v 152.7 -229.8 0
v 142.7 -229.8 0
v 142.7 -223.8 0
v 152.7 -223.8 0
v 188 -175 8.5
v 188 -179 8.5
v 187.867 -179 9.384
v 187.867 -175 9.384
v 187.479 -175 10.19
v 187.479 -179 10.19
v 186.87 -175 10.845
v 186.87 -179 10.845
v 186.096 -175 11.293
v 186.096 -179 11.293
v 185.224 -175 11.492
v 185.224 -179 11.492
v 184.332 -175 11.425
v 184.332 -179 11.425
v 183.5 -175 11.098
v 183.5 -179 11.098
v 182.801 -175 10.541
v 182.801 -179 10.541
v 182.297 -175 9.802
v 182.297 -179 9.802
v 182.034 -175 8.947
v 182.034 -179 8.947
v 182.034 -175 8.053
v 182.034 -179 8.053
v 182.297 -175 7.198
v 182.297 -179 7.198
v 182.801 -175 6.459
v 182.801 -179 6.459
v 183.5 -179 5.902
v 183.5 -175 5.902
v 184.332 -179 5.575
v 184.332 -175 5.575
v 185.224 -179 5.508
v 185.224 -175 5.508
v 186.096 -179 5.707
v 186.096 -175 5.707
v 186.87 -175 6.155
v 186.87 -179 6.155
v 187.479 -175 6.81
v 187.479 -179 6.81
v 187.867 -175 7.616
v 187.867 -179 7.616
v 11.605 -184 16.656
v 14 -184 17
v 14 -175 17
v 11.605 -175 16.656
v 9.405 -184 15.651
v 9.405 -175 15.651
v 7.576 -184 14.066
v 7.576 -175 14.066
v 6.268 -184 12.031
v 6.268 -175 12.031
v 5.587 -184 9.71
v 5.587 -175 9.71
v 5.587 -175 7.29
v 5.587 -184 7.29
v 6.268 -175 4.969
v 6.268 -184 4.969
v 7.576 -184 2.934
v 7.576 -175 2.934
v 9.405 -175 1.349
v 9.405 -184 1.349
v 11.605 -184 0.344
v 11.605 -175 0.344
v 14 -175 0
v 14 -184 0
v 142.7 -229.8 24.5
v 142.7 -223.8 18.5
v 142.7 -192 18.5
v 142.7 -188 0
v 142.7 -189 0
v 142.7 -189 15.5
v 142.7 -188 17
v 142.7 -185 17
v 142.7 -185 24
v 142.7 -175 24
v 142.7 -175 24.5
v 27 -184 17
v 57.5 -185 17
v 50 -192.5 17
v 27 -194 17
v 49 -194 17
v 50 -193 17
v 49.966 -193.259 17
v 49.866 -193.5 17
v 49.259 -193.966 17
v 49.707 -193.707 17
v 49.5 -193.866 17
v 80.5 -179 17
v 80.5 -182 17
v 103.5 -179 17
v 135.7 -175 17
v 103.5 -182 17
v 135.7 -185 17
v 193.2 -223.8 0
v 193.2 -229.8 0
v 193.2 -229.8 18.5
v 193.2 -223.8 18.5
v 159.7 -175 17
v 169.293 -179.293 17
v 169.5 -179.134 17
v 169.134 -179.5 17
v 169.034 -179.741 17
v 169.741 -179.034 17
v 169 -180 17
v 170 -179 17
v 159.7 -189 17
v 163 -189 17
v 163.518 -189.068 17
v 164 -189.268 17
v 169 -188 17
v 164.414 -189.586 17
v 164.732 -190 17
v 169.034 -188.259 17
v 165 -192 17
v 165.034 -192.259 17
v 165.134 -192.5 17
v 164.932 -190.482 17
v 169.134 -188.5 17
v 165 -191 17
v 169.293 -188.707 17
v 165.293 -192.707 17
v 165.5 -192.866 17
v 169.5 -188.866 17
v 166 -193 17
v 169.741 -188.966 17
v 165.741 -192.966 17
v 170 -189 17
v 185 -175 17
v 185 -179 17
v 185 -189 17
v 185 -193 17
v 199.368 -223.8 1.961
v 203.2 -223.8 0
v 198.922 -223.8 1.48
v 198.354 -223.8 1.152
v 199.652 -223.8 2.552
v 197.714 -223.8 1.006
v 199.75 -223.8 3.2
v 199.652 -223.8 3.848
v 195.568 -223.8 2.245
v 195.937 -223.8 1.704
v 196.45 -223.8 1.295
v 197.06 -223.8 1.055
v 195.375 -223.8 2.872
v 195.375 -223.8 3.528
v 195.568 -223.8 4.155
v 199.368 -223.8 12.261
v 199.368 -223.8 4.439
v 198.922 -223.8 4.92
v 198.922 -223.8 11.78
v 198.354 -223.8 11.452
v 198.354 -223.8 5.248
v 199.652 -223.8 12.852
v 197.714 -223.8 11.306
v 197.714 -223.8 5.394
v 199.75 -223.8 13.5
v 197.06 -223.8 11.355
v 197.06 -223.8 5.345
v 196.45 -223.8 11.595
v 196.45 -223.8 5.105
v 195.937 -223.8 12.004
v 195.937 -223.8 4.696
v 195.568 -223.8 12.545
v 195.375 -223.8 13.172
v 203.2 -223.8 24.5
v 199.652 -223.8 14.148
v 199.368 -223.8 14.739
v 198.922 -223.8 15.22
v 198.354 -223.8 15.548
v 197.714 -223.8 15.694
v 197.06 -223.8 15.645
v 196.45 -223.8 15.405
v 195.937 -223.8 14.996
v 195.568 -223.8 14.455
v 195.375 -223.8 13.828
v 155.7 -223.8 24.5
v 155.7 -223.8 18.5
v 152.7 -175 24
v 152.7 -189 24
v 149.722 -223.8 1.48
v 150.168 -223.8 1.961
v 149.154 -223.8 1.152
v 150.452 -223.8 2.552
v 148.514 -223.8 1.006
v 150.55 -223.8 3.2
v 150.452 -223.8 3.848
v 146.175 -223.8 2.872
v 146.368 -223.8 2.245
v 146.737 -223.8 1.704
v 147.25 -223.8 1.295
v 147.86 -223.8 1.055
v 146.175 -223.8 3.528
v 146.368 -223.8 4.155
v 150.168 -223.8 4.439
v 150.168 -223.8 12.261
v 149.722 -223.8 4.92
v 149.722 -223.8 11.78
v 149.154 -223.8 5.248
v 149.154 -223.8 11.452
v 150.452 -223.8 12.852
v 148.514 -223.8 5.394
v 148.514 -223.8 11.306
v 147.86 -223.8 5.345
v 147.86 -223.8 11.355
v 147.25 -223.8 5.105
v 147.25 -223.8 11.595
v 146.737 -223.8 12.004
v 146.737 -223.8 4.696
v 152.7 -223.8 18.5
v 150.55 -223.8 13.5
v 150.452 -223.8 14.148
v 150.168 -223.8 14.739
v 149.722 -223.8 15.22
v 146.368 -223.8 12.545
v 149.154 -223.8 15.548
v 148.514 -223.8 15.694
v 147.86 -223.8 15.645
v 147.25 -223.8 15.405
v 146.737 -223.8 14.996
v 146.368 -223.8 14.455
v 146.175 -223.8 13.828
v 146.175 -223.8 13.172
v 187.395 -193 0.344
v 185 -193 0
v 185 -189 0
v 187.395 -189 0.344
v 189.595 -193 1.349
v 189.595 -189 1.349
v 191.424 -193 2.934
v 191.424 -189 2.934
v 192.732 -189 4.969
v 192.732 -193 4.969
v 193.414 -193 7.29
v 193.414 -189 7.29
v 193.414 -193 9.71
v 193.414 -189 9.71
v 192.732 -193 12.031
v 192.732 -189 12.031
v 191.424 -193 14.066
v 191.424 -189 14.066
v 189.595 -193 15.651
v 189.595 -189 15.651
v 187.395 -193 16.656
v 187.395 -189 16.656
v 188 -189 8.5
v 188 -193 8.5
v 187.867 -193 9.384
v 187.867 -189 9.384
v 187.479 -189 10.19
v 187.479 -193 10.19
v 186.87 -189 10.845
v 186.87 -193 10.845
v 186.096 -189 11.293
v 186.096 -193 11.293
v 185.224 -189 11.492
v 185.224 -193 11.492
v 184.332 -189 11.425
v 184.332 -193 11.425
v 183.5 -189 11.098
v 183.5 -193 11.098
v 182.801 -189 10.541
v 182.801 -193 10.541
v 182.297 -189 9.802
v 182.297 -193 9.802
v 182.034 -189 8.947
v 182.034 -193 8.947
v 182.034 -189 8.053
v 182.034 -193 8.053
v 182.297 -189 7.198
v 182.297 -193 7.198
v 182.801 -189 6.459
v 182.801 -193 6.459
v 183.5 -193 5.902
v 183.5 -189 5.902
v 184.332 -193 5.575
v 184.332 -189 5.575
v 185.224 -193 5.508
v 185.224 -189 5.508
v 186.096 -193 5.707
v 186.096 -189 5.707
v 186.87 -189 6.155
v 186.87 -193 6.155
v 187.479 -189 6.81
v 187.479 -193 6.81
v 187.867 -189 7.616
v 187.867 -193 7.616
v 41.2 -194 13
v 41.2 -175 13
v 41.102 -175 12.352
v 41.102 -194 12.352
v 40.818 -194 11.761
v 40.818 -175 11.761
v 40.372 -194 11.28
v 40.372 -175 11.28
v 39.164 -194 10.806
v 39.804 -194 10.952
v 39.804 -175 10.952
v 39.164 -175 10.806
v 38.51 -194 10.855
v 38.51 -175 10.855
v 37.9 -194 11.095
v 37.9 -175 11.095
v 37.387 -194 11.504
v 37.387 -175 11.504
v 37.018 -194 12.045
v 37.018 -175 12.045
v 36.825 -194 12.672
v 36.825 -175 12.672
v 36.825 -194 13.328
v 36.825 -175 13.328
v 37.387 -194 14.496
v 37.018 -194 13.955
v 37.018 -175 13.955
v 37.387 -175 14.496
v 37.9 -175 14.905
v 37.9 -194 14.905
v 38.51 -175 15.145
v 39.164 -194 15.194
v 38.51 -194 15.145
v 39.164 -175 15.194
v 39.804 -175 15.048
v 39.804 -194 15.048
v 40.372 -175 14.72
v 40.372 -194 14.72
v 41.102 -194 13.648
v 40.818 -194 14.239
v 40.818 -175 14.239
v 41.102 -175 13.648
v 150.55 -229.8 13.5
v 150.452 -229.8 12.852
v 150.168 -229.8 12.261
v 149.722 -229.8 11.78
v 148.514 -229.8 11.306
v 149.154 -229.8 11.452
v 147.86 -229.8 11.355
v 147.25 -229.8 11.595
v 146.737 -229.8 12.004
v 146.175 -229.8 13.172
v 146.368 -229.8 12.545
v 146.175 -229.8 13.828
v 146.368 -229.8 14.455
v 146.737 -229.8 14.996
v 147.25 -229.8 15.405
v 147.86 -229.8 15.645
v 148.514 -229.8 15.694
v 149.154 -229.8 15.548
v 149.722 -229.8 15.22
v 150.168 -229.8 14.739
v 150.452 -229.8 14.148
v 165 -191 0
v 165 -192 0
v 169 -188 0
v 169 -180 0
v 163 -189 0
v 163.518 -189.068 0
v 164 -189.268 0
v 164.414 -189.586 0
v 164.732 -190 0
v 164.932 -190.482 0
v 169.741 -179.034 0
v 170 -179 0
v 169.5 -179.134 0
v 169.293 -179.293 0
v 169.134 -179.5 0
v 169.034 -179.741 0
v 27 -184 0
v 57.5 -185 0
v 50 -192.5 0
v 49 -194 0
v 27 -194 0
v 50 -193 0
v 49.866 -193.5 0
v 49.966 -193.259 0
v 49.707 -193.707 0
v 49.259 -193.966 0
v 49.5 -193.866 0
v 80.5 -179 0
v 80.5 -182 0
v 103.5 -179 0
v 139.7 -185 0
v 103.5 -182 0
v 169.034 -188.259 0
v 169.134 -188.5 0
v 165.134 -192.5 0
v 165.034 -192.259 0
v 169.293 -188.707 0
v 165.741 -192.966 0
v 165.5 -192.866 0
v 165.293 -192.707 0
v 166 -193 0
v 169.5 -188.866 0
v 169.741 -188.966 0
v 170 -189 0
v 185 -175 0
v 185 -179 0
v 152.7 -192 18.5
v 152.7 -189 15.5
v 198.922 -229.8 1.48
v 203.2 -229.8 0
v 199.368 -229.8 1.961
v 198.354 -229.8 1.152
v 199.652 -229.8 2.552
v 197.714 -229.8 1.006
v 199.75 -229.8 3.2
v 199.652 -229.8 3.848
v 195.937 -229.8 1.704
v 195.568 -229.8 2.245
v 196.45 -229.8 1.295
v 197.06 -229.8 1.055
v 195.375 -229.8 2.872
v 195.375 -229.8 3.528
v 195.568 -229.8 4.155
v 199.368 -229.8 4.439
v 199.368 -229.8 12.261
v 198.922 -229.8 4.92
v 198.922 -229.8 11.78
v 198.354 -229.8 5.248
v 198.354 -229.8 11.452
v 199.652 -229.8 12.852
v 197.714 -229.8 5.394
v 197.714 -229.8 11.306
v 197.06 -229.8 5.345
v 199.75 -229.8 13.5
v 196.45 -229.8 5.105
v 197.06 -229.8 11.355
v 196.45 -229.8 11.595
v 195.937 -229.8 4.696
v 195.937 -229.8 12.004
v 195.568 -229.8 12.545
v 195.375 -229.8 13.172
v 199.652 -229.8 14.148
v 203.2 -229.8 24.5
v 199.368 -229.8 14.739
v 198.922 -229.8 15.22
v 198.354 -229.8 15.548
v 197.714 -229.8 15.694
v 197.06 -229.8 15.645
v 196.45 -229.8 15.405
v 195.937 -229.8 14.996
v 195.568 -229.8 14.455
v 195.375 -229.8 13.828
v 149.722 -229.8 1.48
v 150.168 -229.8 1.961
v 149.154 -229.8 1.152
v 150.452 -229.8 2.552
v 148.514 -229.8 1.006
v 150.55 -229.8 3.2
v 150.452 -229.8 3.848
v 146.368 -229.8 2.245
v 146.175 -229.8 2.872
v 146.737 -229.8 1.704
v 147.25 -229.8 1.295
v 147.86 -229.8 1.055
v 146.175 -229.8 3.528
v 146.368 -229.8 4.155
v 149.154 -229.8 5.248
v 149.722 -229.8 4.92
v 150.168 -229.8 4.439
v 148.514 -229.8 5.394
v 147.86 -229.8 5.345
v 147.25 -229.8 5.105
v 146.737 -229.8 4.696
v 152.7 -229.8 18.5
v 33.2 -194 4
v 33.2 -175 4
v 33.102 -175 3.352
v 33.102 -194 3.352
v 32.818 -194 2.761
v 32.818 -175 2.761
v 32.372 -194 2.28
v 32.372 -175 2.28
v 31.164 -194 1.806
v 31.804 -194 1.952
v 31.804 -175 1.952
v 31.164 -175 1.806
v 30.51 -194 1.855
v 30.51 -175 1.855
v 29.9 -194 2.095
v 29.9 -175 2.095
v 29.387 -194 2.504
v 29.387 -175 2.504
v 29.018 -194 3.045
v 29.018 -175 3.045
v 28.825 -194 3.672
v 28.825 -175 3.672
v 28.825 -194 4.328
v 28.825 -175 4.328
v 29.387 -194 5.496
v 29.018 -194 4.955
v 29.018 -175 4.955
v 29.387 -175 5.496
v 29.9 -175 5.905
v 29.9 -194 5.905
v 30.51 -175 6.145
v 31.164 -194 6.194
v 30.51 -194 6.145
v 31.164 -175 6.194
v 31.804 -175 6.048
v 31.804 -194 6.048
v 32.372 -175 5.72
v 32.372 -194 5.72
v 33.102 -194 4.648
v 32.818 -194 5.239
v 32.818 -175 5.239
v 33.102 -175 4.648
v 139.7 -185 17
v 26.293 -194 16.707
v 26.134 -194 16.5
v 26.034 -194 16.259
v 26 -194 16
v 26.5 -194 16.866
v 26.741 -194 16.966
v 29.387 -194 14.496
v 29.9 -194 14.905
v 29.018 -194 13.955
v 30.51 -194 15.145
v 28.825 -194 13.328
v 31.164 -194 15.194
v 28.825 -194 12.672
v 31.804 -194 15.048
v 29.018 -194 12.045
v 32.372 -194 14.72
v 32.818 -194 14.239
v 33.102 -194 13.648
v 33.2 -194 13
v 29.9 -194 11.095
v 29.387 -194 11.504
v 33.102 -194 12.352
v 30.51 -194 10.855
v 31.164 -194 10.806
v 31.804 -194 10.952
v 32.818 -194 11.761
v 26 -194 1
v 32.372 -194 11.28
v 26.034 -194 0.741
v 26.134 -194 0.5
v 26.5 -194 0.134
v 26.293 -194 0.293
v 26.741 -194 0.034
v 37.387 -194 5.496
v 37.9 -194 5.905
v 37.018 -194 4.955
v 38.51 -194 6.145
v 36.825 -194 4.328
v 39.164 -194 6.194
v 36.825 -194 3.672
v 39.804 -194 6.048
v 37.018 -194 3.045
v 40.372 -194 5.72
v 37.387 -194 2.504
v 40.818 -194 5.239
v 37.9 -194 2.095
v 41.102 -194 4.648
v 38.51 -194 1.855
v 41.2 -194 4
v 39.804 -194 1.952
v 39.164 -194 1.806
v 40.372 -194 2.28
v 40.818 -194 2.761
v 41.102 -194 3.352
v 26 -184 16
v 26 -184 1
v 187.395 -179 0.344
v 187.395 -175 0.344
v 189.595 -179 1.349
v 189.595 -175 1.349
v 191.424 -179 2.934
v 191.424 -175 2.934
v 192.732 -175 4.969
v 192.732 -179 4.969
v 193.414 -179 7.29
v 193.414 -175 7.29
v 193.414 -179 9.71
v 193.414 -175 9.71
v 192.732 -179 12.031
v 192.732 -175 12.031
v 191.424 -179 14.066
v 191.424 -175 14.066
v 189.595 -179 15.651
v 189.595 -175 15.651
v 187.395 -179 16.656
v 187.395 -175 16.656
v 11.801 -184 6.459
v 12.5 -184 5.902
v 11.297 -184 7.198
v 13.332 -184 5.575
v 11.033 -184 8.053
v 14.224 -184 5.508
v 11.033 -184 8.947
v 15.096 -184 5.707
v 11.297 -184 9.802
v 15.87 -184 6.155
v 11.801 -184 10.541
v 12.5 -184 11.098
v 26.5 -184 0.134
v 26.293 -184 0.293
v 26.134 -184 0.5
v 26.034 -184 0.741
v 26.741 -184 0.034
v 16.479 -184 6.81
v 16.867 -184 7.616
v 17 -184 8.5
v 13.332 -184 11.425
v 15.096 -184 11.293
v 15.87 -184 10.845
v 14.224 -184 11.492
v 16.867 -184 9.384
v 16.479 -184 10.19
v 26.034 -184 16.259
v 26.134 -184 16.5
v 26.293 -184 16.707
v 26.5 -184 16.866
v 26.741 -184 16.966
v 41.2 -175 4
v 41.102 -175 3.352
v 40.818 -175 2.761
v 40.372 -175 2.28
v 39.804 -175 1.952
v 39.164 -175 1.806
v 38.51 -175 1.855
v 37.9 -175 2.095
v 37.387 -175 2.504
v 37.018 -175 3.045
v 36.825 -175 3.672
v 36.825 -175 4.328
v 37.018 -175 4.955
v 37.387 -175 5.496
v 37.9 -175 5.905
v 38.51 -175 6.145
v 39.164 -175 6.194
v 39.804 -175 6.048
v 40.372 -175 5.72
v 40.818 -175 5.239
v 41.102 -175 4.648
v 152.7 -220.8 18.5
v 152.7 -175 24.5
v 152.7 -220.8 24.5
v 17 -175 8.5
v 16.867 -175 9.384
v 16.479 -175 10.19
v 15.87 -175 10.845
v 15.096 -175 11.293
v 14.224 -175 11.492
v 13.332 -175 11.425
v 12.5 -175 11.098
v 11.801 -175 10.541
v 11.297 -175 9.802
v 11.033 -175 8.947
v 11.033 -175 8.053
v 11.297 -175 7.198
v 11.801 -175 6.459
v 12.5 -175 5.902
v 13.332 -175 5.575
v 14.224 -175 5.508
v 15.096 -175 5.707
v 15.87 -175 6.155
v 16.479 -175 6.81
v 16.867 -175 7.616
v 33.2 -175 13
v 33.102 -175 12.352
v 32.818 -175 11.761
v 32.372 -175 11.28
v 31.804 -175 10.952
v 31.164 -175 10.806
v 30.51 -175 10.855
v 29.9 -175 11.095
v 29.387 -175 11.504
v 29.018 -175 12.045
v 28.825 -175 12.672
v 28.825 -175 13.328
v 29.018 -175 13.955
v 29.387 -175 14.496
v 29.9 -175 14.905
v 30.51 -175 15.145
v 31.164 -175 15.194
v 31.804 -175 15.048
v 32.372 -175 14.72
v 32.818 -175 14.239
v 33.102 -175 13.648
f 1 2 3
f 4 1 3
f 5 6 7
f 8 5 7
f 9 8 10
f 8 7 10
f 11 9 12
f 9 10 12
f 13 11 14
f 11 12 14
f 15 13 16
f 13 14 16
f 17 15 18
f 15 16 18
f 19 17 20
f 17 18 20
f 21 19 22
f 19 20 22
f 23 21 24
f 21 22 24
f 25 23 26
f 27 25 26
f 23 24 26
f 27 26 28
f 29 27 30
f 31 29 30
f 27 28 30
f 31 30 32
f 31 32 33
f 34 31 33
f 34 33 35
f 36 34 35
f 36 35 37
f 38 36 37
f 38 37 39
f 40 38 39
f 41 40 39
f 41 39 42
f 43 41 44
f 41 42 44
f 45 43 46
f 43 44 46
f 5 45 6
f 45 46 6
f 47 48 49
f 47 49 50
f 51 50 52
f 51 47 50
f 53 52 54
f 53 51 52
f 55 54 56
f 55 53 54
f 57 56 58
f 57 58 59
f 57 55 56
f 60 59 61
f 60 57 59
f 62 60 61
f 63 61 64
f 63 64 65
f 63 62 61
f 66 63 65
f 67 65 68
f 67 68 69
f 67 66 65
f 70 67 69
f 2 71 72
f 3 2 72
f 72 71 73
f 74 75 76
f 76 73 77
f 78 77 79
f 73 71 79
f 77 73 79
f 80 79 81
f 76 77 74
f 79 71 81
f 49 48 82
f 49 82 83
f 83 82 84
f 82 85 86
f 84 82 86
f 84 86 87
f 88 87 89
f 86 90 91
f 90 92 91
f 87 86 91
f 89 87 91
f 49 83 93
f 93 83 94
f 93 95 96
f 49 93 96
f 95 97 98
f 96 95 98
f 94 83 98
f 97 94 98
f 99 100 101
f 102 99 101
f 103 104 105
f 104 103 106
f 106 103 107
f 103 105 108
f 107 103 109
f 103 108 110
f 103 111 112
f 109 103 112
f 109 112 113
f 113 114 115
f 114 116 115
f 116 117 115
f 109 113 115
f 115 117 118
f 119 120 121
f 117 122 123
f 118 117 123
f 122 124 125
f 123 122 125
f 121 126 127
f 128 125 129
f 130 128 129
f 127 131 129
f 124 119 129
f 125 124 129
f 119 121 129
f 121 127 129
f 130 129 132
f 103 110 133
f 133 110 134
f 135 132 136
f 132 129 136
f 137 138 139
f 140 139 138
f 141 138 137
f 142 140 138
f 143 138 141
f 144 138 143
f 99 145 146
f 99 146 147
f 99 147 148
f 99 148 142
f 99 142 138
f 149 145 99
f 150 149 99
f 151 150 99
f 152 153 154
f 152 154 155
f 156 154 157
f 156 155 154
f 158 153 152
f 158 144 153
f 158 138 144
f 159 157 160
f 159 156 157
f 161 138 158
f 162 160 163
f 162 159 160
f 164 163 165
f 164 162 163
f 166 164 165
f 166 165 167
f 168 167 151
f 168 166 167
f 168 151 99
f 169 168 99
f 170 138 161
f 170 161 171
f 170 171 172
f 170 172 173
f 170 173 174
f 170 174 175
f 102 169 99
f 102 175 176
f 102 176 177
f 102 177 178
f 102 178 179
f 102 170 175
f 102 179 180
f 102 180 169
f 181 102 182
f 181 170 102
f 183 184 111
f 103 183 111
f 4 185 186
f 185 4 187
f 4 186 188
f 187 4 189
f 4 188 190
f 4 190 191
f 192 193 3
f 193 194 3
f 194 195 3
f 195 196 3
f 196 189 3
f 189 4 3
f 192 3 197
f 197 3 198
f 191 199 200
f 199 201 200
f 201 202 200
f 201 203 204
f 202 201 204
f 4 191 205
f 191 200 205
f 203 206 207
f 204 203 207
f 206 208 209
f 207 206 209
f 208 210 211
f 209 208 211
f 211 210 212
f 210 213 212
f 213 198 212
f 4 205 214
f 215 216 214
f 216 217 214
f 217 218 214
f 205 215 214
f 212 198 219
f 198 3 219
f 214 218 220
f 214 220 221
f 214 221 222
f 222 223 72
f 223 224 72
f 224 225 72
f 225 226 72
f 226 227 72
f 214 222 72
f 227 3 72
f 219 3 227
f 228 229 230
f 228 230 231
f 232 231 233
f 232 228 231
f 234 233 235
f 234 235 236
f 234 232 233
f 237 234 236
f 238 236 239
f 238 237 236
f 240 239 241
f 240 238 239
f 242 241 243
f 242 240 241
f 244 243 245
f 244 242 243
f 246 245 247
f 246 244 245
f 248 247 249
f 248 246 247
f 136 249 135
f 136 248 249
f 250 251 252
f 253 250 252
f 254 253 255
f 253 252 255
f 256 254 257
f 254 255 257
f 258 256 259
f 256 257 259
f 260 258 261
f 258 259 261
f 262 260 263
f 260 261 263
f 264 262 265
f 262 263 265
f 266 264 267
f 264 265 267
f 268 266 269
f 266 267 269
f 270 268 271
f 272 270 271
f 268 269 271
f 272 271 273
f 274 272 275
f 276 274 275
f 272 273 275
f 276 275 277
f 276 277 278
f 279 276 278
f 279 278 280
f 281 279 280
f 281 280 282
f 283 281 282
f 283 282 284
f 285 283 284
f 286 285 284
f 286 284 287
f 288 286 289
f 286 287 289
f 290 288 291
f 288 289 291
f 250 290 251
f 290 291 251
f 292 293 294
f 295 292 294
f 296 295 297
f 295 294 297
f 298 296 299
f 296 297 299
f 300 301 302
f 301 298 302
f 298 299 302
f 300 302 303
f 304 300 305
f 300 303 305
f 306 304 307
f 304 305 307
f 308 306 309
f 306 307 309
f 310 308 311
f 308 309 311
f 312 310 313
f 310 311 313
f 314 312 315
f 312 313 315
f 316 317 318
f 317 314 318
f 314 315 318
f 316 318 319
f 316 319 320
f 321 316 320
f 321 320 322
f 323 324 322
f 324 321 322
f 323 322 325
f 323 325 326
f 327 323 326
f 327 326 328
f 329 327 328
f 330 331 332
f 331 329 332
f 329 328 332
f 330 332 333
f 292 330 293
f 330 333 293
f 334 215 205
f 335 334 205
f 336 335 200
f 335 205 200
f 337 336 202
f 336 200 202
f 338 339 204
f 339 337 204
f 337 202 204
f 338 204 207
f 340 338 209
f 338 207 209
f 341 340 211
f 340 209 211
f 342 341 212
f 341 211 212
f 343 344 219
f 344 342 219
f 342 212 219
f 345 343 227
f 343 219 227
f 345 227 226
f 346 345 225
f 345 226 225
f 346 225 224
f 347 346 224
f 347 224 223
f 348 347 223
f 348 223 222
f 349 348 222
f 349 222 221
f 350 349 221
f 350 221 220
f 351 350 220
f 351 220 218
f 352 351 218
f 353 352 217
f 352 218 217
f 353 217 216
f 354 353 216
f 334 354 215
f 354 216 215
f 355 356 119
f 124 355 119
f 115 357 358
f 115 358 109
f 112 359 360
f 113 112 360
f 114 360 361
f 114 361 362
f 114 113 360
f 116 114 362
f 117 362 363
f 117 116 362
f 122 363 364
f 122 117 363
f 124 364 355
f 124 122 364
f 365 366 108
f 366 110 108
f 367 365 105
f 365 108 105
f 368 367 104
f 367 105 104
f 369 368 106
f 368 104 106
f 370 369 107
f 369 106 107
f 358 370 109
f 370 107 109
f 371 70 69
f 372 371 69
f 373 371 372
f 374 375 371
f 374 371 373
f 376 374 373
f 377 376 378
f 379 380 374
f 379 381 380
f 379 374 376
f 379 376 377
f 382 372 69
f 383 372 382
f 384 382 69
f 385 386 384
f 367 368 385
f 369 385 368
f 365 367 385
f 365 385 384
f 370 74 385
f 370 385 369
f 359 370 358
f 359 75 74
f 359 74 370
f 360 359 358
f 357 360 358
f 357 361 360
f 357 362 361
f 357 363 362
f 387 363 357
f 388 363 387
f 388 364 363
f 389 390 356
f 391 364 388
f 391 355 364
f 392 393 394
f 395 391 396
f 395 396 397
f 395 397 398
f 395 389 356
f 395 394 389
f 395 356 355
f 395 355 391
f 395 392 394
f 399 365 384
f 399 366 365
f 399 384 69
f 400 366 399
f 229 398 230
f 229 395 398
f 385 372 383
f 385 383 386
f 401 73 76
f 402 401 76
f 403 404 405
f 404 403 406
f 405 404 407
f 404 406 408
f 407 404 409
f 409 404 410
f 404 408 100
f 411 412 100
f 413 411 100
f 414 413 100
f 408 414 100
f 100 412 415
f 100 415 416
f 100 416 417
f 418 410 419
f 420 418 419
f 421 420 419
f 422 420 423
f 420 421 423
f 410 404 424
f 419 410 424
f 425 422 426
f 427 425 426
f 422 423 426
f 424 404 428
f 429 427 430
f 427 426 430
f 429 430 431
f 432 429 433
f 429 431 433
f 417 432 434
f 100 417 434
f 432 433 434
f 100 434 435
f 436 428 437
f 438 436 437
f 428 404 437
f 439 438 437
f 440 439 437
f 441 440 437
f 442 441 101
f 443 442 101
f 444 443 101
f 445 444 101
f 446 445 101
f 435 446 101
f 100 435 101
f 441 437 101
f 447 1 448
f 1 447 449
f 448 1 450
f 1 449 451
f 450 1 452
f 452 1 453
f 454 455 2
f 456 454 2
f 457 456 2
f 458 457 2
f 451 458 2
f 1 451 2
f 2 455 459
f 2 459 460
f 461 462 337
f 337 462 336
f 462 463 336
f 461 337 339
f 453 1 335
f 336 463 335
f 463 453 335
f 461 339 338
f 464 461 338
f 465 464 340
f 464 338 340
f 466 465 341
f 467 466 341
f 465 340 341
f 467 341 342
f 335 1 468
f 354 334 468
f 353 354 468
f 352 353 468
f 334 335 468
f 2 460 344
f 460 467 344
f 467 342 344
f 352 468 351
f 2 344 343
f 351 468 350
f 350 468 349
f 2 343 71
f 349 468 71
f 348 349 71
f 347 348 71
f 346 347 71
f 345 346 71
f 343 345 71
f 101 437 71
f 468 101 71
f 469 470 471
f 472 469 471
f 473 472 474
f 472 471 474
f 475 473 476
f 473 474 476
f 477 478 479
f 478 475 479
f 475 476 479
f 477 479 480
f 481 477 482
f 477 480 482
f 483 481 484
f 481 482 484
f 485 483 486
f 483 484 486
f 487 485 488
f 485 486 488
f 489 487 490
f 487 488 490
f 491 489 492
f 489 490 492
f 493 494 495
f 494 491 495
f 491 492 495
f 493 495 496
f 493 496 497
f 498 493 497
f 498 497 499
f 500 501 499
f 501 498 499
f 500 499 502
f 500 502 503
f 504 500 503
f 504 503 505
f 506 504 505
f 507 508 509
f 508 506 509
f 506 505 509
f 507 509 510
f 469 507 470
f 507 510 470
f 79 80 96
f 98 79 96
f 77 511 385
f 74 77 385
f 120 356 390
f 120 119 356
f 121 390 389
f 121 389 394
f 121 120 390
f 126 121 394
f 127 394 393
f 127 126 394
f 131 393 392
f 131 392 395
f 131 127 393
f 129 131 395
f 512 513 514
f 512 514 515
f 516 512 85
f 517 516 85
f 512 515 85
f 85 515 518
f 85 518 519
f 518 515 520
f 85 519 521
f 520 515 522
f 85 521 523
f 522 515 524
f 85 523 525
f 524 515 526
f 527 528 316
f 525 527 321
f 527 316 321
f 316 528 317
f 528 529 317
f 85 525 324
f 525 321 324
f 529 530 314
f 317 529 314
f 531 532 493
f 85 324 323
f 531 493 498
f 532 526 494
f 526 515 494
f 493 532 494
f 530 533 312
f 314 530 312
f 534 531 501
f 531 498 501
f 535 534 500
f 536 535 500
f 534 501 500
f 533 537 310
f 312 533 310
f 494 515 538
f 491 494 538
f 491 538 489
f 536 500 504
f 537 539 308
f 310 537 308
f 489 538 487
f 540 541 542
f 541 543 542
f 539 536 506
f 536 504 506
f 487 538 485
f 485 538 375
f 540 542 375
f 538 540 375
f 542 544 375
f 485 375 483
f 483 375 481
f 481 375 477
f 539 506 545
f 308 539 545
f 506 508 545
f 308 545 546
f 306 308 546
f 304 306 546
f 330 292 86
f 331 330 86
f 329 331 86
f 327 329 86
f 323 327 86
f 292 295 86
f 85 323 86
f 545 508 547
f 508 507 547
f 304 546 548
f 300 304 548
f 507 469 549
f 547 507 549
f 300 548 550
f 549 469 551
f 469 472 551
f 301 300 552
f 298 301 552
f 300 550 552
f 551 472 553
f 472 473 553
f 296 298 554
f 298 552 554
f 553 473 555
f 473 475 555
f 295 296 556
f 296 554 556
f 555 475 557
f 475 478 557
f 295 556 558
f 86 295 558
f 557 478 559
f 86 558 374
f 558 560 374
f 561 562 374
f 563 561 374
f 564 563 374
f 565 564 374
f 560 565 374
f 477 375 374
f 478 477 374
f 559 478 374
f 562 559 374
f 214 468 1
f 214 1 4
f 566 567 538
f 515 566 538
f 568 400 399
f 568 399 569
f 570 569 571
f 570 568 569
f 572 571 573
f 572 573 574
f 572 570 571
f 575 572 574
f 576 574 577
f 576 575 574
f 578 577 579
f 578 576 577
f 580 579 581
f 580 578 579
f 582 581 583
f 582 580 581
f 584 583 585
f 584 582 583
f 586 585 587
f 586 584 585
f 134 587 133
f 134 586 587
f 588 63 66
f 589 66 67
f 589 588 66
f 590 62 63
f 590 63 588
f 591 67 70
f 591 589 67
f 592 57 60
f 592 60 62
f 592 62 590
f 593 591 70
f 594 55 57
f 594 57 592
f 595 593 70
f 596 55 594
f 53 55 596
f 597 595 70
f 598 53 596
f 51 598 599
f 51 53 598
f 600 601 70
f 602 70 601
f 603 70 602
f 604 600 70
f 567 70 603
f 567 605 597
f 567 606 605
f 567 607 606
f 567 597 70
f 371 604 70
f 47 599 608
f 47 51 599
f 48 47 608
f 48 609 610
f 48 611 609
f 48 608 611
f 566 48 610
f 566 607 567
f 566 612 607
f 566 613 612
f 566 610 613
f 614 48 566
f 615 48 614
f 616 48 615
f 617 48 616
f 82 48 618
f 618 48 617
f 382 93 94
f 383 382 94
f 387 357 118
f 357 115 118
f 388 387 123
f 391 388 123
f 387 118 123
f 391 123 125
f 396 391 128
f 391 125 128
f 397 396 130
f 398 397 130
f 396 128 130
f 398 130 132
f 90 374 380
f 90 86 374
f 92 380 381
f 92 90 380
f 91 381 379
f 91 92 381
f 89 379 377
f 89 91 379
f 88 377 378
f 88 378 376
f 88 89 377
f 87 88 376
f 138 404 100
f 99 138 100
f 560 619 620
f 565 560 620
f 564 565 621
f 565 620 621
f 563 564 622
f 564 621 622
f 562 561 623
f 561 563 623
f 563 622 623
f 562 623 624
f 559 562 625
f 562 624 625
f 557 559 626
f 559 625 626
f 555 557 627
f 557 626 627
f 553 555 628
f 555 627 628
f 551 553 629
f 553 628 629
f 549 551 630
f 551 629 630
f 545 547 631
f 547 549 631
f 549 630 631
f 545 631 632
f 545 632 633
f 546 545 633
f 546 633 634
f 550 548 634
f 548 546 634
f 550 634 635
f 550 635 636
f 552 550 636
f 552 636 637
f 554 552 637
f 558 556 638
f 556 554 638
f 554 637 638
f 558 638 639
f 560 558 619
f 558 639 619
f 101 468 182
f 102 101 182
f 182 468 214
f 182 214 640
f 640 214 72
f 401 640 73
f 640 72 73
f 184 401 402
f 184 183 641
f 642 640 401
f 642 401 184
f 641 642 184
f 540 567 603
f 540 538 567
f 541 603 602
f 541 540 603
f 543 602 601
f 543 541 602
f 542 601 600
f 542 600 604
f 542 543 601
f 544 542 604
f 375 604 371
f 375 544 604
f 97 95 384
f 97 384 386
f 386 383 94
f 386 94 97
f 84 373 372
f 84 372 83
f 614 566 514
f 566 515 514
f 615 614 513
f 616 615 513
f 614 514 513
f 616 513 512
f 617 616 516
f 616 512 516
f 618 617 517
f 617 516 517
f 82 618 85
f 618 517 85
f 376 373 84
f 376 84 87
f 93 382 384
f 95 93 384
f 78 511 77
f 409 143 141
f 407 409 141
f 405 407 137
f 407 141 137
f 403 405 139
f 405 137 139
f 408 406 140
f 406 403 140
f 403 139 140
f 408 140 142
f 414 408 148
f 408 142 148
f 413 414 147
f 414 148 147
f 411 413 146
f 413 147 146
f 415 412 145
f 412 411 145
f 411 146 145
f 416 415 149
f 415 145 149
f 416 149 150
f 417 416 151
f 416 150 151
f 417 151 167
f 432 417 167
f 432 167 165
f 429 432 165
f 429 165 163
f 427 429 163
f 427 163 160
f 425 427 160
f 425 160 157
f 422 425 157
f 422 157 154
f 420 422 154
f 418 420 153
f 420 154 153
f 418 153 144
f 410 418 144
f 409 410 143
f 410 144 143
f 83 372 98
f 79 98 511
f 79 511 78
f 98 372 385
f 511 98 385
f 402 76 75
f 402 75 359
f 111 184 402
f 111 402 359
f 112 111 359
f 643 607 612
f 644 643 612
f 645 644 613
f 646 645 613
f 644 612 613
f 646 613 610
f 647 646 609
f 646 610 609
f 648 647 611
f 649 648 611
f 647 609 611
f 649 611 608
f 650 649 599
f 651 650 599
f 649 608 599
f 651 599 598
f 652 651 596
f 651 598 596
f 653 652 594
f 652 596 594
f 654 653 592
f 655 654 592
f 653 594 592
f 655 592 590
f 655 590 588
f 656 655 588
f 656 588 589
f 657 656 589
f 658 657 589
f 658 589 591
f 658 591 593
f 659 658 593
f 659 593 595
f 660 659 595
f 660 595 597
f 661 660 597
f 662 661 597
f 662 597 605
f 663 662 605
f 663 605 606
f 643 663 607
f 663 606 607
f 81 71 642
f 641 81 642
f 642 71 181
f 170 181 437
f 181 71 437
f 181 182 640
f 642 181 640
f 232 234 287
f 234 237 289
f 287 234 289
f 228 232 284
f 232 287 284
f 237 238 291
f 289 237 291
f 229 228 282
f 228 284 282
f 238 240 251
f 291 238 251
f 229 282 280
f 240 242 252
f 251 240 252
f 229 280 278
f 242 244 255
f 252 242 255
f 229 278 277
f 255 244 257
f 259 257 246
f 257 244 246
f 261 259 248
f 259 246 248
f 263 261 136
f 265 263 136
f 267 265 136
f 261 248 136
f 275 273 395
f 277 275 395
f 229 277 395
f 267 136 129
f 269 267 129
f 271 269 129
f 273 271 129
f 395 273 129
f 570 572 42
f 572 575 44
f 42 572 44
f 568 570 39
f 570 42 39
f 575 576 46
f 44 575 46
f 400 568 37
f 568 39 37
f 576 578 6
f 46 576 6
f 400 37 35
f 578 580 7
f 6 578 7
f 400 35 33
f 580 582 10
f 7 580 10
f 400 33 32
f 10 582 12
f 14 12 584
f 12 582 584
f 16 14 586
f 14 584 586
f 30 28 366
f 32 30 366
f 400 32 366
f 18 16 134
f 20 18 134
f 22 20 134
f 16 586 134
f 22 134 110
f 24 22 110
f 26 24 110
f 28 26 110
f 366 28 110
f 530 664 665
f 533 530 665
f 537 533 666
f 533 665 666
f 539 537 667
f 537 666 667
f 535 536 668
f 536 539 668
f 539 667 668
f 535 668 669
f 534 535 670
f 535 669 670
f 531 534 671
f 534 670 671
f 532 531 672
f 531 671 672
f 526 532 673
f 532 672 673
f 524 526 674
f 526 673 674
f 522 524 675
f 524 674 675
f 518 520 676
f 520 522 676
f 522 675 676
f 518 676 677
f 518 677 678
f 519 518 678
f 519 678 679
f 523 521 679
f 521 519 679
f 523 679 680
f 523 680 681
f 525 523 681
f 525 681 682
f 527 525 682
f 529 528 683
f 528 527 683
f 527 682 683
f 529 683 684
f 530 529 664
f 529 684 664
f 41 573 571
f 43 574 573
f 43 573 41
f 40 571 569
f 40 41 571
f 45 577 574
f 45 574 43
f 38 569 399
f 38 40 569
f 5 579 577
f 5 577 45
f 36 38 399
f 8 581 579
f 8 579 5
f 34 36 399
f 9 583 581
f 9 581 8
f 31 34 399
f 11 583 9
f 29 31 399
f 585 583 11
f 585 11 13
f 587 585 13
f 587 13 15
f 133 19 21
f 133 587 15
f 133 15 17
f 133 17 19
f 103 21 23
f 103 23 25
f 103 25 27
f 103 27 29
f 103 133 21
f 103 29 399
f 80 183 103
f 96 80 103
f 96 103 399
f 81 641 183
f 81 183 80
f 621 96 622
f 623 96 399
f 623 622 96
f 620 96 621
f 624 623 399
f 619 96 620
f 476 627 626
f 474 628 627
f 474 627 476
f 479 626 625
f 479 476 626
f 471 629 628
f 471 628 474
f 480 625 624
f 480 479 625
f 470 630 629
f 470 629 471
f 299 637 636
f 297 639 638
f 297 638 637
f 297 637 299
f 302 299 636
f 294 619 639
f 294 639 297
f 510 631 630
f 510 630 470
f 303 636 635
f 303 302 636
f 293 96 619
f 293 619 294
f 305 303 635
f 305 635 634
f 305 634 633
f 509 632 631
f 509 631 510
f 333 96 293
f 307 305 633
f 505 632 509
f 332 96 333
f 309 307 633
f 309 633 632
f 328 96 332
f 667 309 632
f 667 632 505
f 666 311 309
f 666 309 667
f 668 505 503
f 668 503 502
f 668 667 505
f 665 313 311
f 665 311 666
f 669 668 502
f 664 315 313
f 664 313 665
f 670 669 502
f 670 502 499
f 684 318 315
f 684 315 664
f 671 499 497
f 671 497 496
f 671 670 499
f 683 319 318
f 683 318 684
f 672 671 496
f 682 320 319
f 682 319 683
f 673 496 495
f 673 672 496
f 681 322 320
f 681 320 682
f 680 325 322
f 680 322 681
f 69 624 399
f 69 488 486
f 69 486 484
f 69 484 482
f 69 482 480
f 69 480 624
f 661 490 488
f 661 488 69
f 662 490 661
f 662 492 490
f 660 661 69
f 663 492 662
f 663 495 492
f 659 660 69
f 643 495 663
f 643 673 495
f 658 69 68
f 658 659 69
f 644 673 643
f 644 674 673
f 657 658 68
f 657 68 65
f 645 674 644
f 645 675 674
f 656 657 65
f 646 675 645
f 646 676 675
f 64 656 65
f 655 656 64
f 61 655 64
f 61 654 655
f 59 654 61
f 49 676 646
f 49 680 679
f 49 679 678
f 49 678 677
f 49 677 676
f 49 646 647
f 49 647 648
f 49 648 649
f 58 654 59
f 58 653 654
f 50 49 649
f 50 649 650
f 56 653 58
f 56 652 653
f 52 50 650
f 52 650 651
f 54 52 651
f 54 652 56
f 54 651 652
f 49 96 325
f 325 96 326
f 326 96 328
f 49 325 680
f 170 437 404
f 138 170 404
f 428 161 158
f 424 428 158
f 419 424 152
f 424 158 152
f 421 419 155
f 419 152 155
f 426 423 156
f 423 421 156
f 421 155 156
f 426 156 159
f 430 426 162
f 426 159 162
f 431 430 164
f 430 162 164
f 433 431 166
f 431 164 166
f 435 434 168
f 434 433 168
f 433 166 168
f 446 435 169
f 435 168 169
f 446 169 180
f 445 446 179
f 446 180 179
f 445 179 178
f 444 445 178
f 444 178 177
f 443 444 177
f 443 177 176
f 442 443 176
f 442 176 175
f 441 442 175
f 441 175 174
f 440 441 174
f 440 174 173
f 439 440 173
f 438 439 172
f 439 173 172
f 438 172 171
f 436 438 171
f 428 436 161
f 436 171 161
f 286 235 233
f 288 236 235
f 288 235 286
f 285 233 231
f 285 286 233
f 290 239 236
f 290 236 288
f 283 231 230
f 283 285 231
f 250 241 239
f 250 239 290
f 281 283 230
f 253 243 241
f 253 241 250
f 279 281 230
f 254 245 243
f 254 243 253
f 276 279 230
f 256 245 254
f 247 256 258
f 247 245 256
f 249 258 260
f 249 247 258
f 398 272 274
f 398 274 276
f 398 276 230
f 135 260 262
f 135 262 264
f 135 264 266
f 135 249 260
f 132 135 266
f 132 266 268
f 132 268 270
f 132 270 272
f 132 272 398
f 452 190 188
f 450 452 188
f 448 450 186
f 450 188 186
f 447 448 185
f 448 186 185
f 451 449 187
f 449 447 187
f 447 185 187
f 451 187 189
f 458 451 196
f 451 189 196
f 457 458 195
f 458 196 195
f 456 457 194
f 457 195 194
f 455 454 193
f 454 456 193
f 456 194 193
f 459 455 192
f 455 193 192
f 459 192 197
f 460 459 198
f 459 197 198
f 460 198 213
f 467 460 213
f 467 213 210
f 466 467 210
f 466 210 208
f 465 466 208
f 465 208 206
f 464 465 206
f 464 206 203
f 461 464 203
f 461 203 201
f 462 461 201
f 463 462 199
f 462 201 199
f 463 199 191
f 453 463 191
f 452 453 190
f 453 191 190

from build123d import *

# Parameters (mm, degrees)
PAD067_DEPTH           = 10
PAD068_DEPTH           = 6
PAD072_DEPTH           = 14
CYLINDER038_R          = 2.2
CYLINDER038_DEPTH      = 26
CYLINDER038_ROLL_ANGLE = -90
ARRAY012_X_COUNT       = 2
ARRAY012_X_PITCH       = 8
ARRAY012_Z_COUNT       = 2
ARRAY012_Z_PITCH       = 9
BOX047_W               = 24
BOX047_H               = 10
BOX047_DEPTH           = 17
SKETCH056_R            = 3
PAD057_DEPTH           = 9
BOX048_W               = 35
BOX048_H               = 15
BOX048_DEPTH           = 20
BOX044_W               = 23
BOX044_H               = 3
BOX044_DEPTH           = 20
SKETCH049_R            = 3
PAD050_DEPTH           = 4
SKETCH050_R            = 3
PAD051_DEPTH           = 4
BOX043_W               = 20
BOX043_H               = 17
BOX043_DEPTH           = 10
FILLET017_R            = 1
FILLET017_ROLL_ANGLE   = 90
FILLET018_1_R          = 2
FILLET018_2_R          = 1
BOX042_W               = 167
BOX042_H               = 10
BOX042_DEPTH           = 17
CYLINDER037_R          = 2.2
CYLINDER037_DEPTH      = 18
CYLINDER037_ROLL_ANGLE = -90
ARRAY011_X_COUNT       = 2
ARRAY011_X_PITCH       = 49.2
ARRAY011_Z_COUNT       = 2
ARRAY011_Z_PITCH       = 10.3
PAD053_DEPTH           = 6
PAD052_DEPTH           = 10
CHAMFER007_SIZE        = 3
FILLET023_R            = 1
CHAMFER009_SIZE        = 7.5
PAD066_DEPTH           = 10


with BuildPart() as refuerzo009:
    # Sketch067 → Pad067 (new body)
    with BuildSketch(Plane(origin=(142.7, 11, 18.5), x_dir=(0, 0, -1), z_dir=(1, 0, 0))):
        Polygon((0, 0), (0, 3), (3, 0), align=None)
    extrude(amount=PAD067_DEPTH)


with BuildPart() as refuerzo010:
    # Sketch068 → Pad068 (new body)
    with BuildSketch(Plane(origin=(152.7, 45.8, 18.5), x_dir=(0, -1, 0), z_dir=(0, 0, 1))):
        Polygon((0, 0), (0, 3), (3, 0), align=None)
    extrude(amount=PAD068_DEPTH)


with BuildPart() as refuerzo014:
    # Sketch065 → Pad072 (new body)
    with BuildSketch(Plane(origin=(152.7, 11, 17), x_dir=(1, 0, 0), z_dir=(0, -1, 0))):
        Polygon((0, 0), (0, 7), (7, 0), align=None)
    extrude(amount=PAD072_DEPTH)


with BuildPart() as taladros_suje_traccion004:
    # Cylinder038 → Cylinder038 (new body)
    with BuildSketch(Plane.XY):
        Circle(CYLINDER038_R)
    extrude(amount=CYLINDER038_DEPTH)


with BuildPart() as taladros_suje_traccion004_1:
    # Cylinder038 roll: moved
    add(taladros_suje_traccion004.part.rotate(Axis((0, 0, 0), (1, 0, 0)), CYLINDER038_ROLL_ANGLE))


with BuildPart() as taladros_suje_traccion004_2:
    # Cylinder038 placement: moved
    add(taladros_suje_traccion004_1.part.moved(Location((202, 0, 4))))

    # Array012 X: Taladros_suje_traccion004 ×2


with BuildPart() as taladros_suje_traccion004_3:
    add(taladros_suje_traccion004_2.part)
    with Locations(*[(i * ARRAY012_X_PITCH, 0, 0) for i in range(1, ARRAY012_X_COUNT)]):
        add(taladros_suje_traccion004_2.part)

    # Array012 Z: Taladros_suje_traccion004 ×2


with BuildPart() as taladros_suje_traccion004_4:
    add(taladros_suje_traccion004_3.part)
    with Locations(*[(0, 0, i * ARRAY012_Z_PITCH) for i in range(1, ARRAY012_Z_COUNT)]):
        add(taladros_suje_traccion004_3.part)


with BuildPart() as taladros_suje_traccion004_5:
    # Array012 placement: moved
    add(taladros_suje_traccion004_4.part.moved(Location((-171, -5, 0))))


with BuildPart() as suj_traccion002:
    # Box047 → Box047 (new body)
    with BuildSketch(Plane(origin=(26, 6, 0), x_dir=(1, 0, 0), z_dir=(0, 0, 1))):
        with Locations((12, 5)):
            Rectangle(BOX047_W, BOX047_H)
    extrude(amount=BOX047_DEPTH)


with BuildPart() as circulo_tibia_gancho002:
    # Sketch056 → Pad057 (new body)
    with BuildSketch(Plane(origin=(50, 6, 0), x_dir=(1, 0, 0), z_dir=(0, -1, 0))):
        with BuildLine():
            Line((0, 17), (-36, 17))
            ThreePointArc((-36, 17), (-44.500015, 8.5), (-36, 0))
            Line((-36, 0), (0, 0))
            Line((0, 0), (0, 17))
        make_face()
        with Locations((-36.000015, 8.5)):
            Circle(SKETCH056_R, mode=Mode.SUBTRACT)
    extrude(amount=PAD057_DEPTH)


with BuildPart() as resta_redondeo_punta001:
    # Box048 → Box048 (new body)
    with BuildSketch(Plane(origin=(-2, -5, 0), x_dir=(1, 0, 0), z_dir=(0, 0, 1))):
        with Locations((17.5, 7.5)):
            Rectangle(BOX048_W, BOX048_H)
    extrude(amount=BOX048_DEPTH)


with BuildPart() as agarre002:
    # Box044 → Box044 (new body)
    with BuildSketch(Plane(origin=(80.5, 1, 0), x_dir=(1, 0, 0), z_dir=(0, 0, 1))):
        with Locations((11.5, 1.5)):
            Rectangle(BOX044_W, BOX044_H)
    extrude(amount=BOX044_DEPTH)


with BuildPart() as ciculo_gancho007:
    # Sketch049 → Pad050 (new body)
    with BuildSketch(Plane.XY):
        with BuildLine():
            Line((0, 17), (20, 17))
            ThreePointArc((20, 0), (28.500019, 8.5), (20, 17))
            Line((20, 0), (0, 0))
            Line((0, 0), (0, 17))
        make_face()
        with Locations((20.000019, 8.5)):
            Circle(SKETCH049_R, mode=Mode.SUBTRACT)
    extrude(amount=PAD050_DEPTH)


with BuildPart() as ciculo_gancho008:
    # Sketch050 → Pad051 (new body)
    with BuildSketch(Plane.XY.offset(14)):
        with BuildLine():
            Line((0, 17), (20, 17))
            ThreePointArc((20, 0), (28.500019, 8.5), (20, 17))
            Line((20, 0), (0, 0))
            Line((0, 0), (0, 17))
        make_face()
        with Locations((20.000019, 8.5)):
            Circle(SKETCH050_R, mode=Mode.SUBTRACT)
    extrude(amount=PAD051_DEPTH)


with BuildPart() as gancho_femur001:
    # Box043 → Box043 (new body)
    with BuildSketch(Plane(origin=(-16, 0, 4), x_dir=(1, 0, 0), z_dir=(0, 0, 1))):
        with Locations((10, 8.5)):
            Rectangle(BOX043_W, BOX043_H)
    extrude(amount=BOX043_DEPTH)

    # Fusion009003048: union Ciculo_gancho007, Ciculo_gancho008
    add(ciculo_gancho007.part)
    add(ciculo_gancho008.part)

    # Fillet017
    fillet017_edges = [gancho_femur001.edges().sort_by_distance(p)[0] for p in [
        (0, 8.5, 18),
        (-16, 0, 9),
        (-16, 17, 9),
        (0, 8.5, 0),
    ]]
    fillet(fillet017_edges, radius=FILLET017_R)


with BuildPart() as gancho_femur001_1:
    # Fillet017 roll: moved
    add(gancho_femur001.part.rotate(Axis((0, 0, 0), (1, 0, 0)), FILLET017_ROLL_ANGLE))


with BuildPart() as gancho_femur001_2:
    # Fillet017 placement: moved
    add(gancho_femur001_1.part.moved(Location((16, 15, 0))))

    # Fillet018 1
    fillet018_1_edges = [gancho_femur001_2.edges().sort_by_distance(p)[0] for p in [
        (16, 1, 8.5),
        (16, 11, 8.5),
    ]]
    fillet(fillet018_1_edges, radius=FILLET018_1_R)

    # Fillet018 2
    fillet018_2_edges = [gancho_femur001_2.edges().sort_by_distance(p)[0] for p in [
        (20, 1, 8.5),
        (20, 11, 8.5),
    ]]
    fillet(fillet018_2_edges, radius=FILLET018_2_R)


with BuildPart() as gancho_femur001_3:
    # Fillet018 placement: moved
    add(gancho_femur001_2.part.moved(Location((149, 0, 0))))


with BuildPart() as femur_agarre001:
    # Box042 → Box042 (new body)
    with BuildSketch(Plane(origin=(0, -3, 0), x_dir=(1, 0, 0), z_dir=(0, 0, 1))):
        with Locations((83.5, 5)):
            Rectangle(BOX042_W, BOX042_H)
    extrude(amount=BOX042_DEPTH)

    # Fusion009003049: union Gancho_femur001
    add(gancho_femur001_3.part)

    # Cut038: cut Agarre002
    add(agarre002.part, mode=Mode.SUBTRACT)


with BuildPart() as taladros_suje_motor003:
    # Cylinder037 → Cylinder037 (new body)
    with BuildSketch(Plane.XY):
        Circle(CYLINDER037_R)
    extrude(amount=CYLINDER037_DEPTH)


with BuildPart() as taladros_suje_motor003_1:
    # Cylinder037 roll: moved
    add(taladros_suje_motor003.part.rotate(Axis((0, 0, 0), (1, 0, 0)), CYLINDER037_ROLL_ANGLE))


with BuildPart() as taladros_suje_motor003_2:
    # Cylinder037 placement: moved
    add(taladros_suje_motor003_1.part.moved(Location((150.075, 41, 13.5))))

    # Array011 X: Taladros_suje_motor003 ×2


with BuildPart() as taladros_suje_motor003_3:
    add(taladros_suje_motor003_2.part)
    with Locations(*[(i * ARRAY011_X_PITCH, 0, 0) for i in range(1, ARRAY011_X_COUNT)]):
        add(taladros_suje_motor003_2.part)

    # Array011 Z: Taladros_suje_motor003 ×2


with BuildPart() as taladros_suje_motor003_4:
    add(taladros_suje_motor003_3.part)
    with Locations(*[(0, 0, -i * ARRAY011_Z_PITCH) for i in range(1, ARRAY011_Z_COUNT)]):
        add(taladros_suje_motor003_3.part)


with BuildPart() as suje_motor010:
    # Sketch052 → Pad053 (new body)
    with BuildSketch(Plane(origin=(10, 54.8, 0), x_dir=(1, 0, 0), z_dir=(0, -1, 0))):
        Polygon((0, 18.5), (0, 24.5), (50.5, 24.5), (50.5, 0), (40.5, 0), (40.5, 18.5), align=None)
    extrude(amount=PAD053_DEPTH)


with BuildPart() as femur_refuerzo001:
    # Sketch051 → Pad052 (new body)
    with BuildSketch(Plane.YZ):
        Polygon((14, 0), (0, 0), (0, 24.5), (54.8, 24.5), (54.8, 0), (48.8, 0), (48.8, 18.5), (14, 18.5), align=None)
    extrude(amount=PAD052_DEPTH)

    # Fusion009003050: union Suje_motor010
    add(suje_motor010.part)


with BuildPart() as femur_refuerzo001_1:
    # Fusion009003050 placement: moved
    add(femur_refuerzo001.part.moved(Location((144.425, -3, 0))))

    # Cut037: cut Taladros_suje_motor003
    add(taladros_suje_motor003_4.part, mode=Mode.SUBTRACT)


with BuildPart() as femur_refuerzo001_2:
    # Cut037 placement: moved
    add(femur_refuerzo001_1.part.moved(Location((-1.725, 0, 0))))

    # Fusion009003051: union Femur_agarre001
    add(femur_agarre001.part)

    # Chamfer007
    chamfer007_edges = [femur_refuerzo001_2.edges().sort_by_distance(p)[0] for p in [
        (142.7, 7, 8.5),
    ]]
    chamfer(chamfer007_edges, length=CHAMFER007_SIZE)

    # Cut039: cut resta_redondeo_punta001
    add(resta_redondeo_punta001.part, mode=Mode.SUBTRACT)

    # Fusion009003053: union Circulo_tibia_gancho002
    add(circulo_tibia_gancho002.part)

    # Fusion009003054: union Suj_traccion002
    add(suj_traccion002.part)

    # Cut040: cut Taladros_suje_traccion004
    add(taladros_suje_traccion004_5.part, mode=Mode.SUBTRACT)

    # Fillet023
    fillet023_edges = [femur_refuerzo001_2.edges().sort_by_distance(p)[0] for p in [
        (50, 16, 8.5),
        (26, 11, 0),
        (26, 11, 17),
    ]]
    fillet(fillet023_edges, radius=FILLET023_R)

    # Chamfer009
    chamfer009_edges = [femur_refuerzo001_2.edges().sort_by_distance(p)[0] for p in [
        (50, 7, 8.5),
    ]]
    chamfer(chamfer009_edges, length=CHAMFER009_SIZE)


with BuildPart() as femur_izquierdo_full001:
    # Sketch066 → Pad066 (new body)
    with BuildSketch(Plane(origin=(142.7, -3, 17), x_dir=(-1, 0, 0), z_dir=(0, 1, 0))):
        Polygon((0, 0), (0, 7), (7, 0), align=None)
    extrude(amount=PAD066_DEPTH)

    # Fusion009003066: union Refuerzo009, Refuerzo010, Refuerzo014, Femur_refuerzo001
    add(refuerzo009.part)
    add(refuerzo010.part)
    add(refuerzo014.part)
    add(femur_refuerzo001_2.part)


with BuildPart() as femur_derecha_full:
    # Part__Mirroring012: instance of Femur_izquierdo_full001
    add(femur_izquierdo_full001.part.mirror(Plane(origin=(0, 0, 0), x_dir=(1, 0, 0), z_dir=(0, 1, 0))))


with BuildPart() as femur_derecha_full_1:
    # Part__Mirroring012 placement: moved
    add(femur_derecha_full.part.moved(Location((0, -178, 0))))


solid = femur_derecha_full_1.part
